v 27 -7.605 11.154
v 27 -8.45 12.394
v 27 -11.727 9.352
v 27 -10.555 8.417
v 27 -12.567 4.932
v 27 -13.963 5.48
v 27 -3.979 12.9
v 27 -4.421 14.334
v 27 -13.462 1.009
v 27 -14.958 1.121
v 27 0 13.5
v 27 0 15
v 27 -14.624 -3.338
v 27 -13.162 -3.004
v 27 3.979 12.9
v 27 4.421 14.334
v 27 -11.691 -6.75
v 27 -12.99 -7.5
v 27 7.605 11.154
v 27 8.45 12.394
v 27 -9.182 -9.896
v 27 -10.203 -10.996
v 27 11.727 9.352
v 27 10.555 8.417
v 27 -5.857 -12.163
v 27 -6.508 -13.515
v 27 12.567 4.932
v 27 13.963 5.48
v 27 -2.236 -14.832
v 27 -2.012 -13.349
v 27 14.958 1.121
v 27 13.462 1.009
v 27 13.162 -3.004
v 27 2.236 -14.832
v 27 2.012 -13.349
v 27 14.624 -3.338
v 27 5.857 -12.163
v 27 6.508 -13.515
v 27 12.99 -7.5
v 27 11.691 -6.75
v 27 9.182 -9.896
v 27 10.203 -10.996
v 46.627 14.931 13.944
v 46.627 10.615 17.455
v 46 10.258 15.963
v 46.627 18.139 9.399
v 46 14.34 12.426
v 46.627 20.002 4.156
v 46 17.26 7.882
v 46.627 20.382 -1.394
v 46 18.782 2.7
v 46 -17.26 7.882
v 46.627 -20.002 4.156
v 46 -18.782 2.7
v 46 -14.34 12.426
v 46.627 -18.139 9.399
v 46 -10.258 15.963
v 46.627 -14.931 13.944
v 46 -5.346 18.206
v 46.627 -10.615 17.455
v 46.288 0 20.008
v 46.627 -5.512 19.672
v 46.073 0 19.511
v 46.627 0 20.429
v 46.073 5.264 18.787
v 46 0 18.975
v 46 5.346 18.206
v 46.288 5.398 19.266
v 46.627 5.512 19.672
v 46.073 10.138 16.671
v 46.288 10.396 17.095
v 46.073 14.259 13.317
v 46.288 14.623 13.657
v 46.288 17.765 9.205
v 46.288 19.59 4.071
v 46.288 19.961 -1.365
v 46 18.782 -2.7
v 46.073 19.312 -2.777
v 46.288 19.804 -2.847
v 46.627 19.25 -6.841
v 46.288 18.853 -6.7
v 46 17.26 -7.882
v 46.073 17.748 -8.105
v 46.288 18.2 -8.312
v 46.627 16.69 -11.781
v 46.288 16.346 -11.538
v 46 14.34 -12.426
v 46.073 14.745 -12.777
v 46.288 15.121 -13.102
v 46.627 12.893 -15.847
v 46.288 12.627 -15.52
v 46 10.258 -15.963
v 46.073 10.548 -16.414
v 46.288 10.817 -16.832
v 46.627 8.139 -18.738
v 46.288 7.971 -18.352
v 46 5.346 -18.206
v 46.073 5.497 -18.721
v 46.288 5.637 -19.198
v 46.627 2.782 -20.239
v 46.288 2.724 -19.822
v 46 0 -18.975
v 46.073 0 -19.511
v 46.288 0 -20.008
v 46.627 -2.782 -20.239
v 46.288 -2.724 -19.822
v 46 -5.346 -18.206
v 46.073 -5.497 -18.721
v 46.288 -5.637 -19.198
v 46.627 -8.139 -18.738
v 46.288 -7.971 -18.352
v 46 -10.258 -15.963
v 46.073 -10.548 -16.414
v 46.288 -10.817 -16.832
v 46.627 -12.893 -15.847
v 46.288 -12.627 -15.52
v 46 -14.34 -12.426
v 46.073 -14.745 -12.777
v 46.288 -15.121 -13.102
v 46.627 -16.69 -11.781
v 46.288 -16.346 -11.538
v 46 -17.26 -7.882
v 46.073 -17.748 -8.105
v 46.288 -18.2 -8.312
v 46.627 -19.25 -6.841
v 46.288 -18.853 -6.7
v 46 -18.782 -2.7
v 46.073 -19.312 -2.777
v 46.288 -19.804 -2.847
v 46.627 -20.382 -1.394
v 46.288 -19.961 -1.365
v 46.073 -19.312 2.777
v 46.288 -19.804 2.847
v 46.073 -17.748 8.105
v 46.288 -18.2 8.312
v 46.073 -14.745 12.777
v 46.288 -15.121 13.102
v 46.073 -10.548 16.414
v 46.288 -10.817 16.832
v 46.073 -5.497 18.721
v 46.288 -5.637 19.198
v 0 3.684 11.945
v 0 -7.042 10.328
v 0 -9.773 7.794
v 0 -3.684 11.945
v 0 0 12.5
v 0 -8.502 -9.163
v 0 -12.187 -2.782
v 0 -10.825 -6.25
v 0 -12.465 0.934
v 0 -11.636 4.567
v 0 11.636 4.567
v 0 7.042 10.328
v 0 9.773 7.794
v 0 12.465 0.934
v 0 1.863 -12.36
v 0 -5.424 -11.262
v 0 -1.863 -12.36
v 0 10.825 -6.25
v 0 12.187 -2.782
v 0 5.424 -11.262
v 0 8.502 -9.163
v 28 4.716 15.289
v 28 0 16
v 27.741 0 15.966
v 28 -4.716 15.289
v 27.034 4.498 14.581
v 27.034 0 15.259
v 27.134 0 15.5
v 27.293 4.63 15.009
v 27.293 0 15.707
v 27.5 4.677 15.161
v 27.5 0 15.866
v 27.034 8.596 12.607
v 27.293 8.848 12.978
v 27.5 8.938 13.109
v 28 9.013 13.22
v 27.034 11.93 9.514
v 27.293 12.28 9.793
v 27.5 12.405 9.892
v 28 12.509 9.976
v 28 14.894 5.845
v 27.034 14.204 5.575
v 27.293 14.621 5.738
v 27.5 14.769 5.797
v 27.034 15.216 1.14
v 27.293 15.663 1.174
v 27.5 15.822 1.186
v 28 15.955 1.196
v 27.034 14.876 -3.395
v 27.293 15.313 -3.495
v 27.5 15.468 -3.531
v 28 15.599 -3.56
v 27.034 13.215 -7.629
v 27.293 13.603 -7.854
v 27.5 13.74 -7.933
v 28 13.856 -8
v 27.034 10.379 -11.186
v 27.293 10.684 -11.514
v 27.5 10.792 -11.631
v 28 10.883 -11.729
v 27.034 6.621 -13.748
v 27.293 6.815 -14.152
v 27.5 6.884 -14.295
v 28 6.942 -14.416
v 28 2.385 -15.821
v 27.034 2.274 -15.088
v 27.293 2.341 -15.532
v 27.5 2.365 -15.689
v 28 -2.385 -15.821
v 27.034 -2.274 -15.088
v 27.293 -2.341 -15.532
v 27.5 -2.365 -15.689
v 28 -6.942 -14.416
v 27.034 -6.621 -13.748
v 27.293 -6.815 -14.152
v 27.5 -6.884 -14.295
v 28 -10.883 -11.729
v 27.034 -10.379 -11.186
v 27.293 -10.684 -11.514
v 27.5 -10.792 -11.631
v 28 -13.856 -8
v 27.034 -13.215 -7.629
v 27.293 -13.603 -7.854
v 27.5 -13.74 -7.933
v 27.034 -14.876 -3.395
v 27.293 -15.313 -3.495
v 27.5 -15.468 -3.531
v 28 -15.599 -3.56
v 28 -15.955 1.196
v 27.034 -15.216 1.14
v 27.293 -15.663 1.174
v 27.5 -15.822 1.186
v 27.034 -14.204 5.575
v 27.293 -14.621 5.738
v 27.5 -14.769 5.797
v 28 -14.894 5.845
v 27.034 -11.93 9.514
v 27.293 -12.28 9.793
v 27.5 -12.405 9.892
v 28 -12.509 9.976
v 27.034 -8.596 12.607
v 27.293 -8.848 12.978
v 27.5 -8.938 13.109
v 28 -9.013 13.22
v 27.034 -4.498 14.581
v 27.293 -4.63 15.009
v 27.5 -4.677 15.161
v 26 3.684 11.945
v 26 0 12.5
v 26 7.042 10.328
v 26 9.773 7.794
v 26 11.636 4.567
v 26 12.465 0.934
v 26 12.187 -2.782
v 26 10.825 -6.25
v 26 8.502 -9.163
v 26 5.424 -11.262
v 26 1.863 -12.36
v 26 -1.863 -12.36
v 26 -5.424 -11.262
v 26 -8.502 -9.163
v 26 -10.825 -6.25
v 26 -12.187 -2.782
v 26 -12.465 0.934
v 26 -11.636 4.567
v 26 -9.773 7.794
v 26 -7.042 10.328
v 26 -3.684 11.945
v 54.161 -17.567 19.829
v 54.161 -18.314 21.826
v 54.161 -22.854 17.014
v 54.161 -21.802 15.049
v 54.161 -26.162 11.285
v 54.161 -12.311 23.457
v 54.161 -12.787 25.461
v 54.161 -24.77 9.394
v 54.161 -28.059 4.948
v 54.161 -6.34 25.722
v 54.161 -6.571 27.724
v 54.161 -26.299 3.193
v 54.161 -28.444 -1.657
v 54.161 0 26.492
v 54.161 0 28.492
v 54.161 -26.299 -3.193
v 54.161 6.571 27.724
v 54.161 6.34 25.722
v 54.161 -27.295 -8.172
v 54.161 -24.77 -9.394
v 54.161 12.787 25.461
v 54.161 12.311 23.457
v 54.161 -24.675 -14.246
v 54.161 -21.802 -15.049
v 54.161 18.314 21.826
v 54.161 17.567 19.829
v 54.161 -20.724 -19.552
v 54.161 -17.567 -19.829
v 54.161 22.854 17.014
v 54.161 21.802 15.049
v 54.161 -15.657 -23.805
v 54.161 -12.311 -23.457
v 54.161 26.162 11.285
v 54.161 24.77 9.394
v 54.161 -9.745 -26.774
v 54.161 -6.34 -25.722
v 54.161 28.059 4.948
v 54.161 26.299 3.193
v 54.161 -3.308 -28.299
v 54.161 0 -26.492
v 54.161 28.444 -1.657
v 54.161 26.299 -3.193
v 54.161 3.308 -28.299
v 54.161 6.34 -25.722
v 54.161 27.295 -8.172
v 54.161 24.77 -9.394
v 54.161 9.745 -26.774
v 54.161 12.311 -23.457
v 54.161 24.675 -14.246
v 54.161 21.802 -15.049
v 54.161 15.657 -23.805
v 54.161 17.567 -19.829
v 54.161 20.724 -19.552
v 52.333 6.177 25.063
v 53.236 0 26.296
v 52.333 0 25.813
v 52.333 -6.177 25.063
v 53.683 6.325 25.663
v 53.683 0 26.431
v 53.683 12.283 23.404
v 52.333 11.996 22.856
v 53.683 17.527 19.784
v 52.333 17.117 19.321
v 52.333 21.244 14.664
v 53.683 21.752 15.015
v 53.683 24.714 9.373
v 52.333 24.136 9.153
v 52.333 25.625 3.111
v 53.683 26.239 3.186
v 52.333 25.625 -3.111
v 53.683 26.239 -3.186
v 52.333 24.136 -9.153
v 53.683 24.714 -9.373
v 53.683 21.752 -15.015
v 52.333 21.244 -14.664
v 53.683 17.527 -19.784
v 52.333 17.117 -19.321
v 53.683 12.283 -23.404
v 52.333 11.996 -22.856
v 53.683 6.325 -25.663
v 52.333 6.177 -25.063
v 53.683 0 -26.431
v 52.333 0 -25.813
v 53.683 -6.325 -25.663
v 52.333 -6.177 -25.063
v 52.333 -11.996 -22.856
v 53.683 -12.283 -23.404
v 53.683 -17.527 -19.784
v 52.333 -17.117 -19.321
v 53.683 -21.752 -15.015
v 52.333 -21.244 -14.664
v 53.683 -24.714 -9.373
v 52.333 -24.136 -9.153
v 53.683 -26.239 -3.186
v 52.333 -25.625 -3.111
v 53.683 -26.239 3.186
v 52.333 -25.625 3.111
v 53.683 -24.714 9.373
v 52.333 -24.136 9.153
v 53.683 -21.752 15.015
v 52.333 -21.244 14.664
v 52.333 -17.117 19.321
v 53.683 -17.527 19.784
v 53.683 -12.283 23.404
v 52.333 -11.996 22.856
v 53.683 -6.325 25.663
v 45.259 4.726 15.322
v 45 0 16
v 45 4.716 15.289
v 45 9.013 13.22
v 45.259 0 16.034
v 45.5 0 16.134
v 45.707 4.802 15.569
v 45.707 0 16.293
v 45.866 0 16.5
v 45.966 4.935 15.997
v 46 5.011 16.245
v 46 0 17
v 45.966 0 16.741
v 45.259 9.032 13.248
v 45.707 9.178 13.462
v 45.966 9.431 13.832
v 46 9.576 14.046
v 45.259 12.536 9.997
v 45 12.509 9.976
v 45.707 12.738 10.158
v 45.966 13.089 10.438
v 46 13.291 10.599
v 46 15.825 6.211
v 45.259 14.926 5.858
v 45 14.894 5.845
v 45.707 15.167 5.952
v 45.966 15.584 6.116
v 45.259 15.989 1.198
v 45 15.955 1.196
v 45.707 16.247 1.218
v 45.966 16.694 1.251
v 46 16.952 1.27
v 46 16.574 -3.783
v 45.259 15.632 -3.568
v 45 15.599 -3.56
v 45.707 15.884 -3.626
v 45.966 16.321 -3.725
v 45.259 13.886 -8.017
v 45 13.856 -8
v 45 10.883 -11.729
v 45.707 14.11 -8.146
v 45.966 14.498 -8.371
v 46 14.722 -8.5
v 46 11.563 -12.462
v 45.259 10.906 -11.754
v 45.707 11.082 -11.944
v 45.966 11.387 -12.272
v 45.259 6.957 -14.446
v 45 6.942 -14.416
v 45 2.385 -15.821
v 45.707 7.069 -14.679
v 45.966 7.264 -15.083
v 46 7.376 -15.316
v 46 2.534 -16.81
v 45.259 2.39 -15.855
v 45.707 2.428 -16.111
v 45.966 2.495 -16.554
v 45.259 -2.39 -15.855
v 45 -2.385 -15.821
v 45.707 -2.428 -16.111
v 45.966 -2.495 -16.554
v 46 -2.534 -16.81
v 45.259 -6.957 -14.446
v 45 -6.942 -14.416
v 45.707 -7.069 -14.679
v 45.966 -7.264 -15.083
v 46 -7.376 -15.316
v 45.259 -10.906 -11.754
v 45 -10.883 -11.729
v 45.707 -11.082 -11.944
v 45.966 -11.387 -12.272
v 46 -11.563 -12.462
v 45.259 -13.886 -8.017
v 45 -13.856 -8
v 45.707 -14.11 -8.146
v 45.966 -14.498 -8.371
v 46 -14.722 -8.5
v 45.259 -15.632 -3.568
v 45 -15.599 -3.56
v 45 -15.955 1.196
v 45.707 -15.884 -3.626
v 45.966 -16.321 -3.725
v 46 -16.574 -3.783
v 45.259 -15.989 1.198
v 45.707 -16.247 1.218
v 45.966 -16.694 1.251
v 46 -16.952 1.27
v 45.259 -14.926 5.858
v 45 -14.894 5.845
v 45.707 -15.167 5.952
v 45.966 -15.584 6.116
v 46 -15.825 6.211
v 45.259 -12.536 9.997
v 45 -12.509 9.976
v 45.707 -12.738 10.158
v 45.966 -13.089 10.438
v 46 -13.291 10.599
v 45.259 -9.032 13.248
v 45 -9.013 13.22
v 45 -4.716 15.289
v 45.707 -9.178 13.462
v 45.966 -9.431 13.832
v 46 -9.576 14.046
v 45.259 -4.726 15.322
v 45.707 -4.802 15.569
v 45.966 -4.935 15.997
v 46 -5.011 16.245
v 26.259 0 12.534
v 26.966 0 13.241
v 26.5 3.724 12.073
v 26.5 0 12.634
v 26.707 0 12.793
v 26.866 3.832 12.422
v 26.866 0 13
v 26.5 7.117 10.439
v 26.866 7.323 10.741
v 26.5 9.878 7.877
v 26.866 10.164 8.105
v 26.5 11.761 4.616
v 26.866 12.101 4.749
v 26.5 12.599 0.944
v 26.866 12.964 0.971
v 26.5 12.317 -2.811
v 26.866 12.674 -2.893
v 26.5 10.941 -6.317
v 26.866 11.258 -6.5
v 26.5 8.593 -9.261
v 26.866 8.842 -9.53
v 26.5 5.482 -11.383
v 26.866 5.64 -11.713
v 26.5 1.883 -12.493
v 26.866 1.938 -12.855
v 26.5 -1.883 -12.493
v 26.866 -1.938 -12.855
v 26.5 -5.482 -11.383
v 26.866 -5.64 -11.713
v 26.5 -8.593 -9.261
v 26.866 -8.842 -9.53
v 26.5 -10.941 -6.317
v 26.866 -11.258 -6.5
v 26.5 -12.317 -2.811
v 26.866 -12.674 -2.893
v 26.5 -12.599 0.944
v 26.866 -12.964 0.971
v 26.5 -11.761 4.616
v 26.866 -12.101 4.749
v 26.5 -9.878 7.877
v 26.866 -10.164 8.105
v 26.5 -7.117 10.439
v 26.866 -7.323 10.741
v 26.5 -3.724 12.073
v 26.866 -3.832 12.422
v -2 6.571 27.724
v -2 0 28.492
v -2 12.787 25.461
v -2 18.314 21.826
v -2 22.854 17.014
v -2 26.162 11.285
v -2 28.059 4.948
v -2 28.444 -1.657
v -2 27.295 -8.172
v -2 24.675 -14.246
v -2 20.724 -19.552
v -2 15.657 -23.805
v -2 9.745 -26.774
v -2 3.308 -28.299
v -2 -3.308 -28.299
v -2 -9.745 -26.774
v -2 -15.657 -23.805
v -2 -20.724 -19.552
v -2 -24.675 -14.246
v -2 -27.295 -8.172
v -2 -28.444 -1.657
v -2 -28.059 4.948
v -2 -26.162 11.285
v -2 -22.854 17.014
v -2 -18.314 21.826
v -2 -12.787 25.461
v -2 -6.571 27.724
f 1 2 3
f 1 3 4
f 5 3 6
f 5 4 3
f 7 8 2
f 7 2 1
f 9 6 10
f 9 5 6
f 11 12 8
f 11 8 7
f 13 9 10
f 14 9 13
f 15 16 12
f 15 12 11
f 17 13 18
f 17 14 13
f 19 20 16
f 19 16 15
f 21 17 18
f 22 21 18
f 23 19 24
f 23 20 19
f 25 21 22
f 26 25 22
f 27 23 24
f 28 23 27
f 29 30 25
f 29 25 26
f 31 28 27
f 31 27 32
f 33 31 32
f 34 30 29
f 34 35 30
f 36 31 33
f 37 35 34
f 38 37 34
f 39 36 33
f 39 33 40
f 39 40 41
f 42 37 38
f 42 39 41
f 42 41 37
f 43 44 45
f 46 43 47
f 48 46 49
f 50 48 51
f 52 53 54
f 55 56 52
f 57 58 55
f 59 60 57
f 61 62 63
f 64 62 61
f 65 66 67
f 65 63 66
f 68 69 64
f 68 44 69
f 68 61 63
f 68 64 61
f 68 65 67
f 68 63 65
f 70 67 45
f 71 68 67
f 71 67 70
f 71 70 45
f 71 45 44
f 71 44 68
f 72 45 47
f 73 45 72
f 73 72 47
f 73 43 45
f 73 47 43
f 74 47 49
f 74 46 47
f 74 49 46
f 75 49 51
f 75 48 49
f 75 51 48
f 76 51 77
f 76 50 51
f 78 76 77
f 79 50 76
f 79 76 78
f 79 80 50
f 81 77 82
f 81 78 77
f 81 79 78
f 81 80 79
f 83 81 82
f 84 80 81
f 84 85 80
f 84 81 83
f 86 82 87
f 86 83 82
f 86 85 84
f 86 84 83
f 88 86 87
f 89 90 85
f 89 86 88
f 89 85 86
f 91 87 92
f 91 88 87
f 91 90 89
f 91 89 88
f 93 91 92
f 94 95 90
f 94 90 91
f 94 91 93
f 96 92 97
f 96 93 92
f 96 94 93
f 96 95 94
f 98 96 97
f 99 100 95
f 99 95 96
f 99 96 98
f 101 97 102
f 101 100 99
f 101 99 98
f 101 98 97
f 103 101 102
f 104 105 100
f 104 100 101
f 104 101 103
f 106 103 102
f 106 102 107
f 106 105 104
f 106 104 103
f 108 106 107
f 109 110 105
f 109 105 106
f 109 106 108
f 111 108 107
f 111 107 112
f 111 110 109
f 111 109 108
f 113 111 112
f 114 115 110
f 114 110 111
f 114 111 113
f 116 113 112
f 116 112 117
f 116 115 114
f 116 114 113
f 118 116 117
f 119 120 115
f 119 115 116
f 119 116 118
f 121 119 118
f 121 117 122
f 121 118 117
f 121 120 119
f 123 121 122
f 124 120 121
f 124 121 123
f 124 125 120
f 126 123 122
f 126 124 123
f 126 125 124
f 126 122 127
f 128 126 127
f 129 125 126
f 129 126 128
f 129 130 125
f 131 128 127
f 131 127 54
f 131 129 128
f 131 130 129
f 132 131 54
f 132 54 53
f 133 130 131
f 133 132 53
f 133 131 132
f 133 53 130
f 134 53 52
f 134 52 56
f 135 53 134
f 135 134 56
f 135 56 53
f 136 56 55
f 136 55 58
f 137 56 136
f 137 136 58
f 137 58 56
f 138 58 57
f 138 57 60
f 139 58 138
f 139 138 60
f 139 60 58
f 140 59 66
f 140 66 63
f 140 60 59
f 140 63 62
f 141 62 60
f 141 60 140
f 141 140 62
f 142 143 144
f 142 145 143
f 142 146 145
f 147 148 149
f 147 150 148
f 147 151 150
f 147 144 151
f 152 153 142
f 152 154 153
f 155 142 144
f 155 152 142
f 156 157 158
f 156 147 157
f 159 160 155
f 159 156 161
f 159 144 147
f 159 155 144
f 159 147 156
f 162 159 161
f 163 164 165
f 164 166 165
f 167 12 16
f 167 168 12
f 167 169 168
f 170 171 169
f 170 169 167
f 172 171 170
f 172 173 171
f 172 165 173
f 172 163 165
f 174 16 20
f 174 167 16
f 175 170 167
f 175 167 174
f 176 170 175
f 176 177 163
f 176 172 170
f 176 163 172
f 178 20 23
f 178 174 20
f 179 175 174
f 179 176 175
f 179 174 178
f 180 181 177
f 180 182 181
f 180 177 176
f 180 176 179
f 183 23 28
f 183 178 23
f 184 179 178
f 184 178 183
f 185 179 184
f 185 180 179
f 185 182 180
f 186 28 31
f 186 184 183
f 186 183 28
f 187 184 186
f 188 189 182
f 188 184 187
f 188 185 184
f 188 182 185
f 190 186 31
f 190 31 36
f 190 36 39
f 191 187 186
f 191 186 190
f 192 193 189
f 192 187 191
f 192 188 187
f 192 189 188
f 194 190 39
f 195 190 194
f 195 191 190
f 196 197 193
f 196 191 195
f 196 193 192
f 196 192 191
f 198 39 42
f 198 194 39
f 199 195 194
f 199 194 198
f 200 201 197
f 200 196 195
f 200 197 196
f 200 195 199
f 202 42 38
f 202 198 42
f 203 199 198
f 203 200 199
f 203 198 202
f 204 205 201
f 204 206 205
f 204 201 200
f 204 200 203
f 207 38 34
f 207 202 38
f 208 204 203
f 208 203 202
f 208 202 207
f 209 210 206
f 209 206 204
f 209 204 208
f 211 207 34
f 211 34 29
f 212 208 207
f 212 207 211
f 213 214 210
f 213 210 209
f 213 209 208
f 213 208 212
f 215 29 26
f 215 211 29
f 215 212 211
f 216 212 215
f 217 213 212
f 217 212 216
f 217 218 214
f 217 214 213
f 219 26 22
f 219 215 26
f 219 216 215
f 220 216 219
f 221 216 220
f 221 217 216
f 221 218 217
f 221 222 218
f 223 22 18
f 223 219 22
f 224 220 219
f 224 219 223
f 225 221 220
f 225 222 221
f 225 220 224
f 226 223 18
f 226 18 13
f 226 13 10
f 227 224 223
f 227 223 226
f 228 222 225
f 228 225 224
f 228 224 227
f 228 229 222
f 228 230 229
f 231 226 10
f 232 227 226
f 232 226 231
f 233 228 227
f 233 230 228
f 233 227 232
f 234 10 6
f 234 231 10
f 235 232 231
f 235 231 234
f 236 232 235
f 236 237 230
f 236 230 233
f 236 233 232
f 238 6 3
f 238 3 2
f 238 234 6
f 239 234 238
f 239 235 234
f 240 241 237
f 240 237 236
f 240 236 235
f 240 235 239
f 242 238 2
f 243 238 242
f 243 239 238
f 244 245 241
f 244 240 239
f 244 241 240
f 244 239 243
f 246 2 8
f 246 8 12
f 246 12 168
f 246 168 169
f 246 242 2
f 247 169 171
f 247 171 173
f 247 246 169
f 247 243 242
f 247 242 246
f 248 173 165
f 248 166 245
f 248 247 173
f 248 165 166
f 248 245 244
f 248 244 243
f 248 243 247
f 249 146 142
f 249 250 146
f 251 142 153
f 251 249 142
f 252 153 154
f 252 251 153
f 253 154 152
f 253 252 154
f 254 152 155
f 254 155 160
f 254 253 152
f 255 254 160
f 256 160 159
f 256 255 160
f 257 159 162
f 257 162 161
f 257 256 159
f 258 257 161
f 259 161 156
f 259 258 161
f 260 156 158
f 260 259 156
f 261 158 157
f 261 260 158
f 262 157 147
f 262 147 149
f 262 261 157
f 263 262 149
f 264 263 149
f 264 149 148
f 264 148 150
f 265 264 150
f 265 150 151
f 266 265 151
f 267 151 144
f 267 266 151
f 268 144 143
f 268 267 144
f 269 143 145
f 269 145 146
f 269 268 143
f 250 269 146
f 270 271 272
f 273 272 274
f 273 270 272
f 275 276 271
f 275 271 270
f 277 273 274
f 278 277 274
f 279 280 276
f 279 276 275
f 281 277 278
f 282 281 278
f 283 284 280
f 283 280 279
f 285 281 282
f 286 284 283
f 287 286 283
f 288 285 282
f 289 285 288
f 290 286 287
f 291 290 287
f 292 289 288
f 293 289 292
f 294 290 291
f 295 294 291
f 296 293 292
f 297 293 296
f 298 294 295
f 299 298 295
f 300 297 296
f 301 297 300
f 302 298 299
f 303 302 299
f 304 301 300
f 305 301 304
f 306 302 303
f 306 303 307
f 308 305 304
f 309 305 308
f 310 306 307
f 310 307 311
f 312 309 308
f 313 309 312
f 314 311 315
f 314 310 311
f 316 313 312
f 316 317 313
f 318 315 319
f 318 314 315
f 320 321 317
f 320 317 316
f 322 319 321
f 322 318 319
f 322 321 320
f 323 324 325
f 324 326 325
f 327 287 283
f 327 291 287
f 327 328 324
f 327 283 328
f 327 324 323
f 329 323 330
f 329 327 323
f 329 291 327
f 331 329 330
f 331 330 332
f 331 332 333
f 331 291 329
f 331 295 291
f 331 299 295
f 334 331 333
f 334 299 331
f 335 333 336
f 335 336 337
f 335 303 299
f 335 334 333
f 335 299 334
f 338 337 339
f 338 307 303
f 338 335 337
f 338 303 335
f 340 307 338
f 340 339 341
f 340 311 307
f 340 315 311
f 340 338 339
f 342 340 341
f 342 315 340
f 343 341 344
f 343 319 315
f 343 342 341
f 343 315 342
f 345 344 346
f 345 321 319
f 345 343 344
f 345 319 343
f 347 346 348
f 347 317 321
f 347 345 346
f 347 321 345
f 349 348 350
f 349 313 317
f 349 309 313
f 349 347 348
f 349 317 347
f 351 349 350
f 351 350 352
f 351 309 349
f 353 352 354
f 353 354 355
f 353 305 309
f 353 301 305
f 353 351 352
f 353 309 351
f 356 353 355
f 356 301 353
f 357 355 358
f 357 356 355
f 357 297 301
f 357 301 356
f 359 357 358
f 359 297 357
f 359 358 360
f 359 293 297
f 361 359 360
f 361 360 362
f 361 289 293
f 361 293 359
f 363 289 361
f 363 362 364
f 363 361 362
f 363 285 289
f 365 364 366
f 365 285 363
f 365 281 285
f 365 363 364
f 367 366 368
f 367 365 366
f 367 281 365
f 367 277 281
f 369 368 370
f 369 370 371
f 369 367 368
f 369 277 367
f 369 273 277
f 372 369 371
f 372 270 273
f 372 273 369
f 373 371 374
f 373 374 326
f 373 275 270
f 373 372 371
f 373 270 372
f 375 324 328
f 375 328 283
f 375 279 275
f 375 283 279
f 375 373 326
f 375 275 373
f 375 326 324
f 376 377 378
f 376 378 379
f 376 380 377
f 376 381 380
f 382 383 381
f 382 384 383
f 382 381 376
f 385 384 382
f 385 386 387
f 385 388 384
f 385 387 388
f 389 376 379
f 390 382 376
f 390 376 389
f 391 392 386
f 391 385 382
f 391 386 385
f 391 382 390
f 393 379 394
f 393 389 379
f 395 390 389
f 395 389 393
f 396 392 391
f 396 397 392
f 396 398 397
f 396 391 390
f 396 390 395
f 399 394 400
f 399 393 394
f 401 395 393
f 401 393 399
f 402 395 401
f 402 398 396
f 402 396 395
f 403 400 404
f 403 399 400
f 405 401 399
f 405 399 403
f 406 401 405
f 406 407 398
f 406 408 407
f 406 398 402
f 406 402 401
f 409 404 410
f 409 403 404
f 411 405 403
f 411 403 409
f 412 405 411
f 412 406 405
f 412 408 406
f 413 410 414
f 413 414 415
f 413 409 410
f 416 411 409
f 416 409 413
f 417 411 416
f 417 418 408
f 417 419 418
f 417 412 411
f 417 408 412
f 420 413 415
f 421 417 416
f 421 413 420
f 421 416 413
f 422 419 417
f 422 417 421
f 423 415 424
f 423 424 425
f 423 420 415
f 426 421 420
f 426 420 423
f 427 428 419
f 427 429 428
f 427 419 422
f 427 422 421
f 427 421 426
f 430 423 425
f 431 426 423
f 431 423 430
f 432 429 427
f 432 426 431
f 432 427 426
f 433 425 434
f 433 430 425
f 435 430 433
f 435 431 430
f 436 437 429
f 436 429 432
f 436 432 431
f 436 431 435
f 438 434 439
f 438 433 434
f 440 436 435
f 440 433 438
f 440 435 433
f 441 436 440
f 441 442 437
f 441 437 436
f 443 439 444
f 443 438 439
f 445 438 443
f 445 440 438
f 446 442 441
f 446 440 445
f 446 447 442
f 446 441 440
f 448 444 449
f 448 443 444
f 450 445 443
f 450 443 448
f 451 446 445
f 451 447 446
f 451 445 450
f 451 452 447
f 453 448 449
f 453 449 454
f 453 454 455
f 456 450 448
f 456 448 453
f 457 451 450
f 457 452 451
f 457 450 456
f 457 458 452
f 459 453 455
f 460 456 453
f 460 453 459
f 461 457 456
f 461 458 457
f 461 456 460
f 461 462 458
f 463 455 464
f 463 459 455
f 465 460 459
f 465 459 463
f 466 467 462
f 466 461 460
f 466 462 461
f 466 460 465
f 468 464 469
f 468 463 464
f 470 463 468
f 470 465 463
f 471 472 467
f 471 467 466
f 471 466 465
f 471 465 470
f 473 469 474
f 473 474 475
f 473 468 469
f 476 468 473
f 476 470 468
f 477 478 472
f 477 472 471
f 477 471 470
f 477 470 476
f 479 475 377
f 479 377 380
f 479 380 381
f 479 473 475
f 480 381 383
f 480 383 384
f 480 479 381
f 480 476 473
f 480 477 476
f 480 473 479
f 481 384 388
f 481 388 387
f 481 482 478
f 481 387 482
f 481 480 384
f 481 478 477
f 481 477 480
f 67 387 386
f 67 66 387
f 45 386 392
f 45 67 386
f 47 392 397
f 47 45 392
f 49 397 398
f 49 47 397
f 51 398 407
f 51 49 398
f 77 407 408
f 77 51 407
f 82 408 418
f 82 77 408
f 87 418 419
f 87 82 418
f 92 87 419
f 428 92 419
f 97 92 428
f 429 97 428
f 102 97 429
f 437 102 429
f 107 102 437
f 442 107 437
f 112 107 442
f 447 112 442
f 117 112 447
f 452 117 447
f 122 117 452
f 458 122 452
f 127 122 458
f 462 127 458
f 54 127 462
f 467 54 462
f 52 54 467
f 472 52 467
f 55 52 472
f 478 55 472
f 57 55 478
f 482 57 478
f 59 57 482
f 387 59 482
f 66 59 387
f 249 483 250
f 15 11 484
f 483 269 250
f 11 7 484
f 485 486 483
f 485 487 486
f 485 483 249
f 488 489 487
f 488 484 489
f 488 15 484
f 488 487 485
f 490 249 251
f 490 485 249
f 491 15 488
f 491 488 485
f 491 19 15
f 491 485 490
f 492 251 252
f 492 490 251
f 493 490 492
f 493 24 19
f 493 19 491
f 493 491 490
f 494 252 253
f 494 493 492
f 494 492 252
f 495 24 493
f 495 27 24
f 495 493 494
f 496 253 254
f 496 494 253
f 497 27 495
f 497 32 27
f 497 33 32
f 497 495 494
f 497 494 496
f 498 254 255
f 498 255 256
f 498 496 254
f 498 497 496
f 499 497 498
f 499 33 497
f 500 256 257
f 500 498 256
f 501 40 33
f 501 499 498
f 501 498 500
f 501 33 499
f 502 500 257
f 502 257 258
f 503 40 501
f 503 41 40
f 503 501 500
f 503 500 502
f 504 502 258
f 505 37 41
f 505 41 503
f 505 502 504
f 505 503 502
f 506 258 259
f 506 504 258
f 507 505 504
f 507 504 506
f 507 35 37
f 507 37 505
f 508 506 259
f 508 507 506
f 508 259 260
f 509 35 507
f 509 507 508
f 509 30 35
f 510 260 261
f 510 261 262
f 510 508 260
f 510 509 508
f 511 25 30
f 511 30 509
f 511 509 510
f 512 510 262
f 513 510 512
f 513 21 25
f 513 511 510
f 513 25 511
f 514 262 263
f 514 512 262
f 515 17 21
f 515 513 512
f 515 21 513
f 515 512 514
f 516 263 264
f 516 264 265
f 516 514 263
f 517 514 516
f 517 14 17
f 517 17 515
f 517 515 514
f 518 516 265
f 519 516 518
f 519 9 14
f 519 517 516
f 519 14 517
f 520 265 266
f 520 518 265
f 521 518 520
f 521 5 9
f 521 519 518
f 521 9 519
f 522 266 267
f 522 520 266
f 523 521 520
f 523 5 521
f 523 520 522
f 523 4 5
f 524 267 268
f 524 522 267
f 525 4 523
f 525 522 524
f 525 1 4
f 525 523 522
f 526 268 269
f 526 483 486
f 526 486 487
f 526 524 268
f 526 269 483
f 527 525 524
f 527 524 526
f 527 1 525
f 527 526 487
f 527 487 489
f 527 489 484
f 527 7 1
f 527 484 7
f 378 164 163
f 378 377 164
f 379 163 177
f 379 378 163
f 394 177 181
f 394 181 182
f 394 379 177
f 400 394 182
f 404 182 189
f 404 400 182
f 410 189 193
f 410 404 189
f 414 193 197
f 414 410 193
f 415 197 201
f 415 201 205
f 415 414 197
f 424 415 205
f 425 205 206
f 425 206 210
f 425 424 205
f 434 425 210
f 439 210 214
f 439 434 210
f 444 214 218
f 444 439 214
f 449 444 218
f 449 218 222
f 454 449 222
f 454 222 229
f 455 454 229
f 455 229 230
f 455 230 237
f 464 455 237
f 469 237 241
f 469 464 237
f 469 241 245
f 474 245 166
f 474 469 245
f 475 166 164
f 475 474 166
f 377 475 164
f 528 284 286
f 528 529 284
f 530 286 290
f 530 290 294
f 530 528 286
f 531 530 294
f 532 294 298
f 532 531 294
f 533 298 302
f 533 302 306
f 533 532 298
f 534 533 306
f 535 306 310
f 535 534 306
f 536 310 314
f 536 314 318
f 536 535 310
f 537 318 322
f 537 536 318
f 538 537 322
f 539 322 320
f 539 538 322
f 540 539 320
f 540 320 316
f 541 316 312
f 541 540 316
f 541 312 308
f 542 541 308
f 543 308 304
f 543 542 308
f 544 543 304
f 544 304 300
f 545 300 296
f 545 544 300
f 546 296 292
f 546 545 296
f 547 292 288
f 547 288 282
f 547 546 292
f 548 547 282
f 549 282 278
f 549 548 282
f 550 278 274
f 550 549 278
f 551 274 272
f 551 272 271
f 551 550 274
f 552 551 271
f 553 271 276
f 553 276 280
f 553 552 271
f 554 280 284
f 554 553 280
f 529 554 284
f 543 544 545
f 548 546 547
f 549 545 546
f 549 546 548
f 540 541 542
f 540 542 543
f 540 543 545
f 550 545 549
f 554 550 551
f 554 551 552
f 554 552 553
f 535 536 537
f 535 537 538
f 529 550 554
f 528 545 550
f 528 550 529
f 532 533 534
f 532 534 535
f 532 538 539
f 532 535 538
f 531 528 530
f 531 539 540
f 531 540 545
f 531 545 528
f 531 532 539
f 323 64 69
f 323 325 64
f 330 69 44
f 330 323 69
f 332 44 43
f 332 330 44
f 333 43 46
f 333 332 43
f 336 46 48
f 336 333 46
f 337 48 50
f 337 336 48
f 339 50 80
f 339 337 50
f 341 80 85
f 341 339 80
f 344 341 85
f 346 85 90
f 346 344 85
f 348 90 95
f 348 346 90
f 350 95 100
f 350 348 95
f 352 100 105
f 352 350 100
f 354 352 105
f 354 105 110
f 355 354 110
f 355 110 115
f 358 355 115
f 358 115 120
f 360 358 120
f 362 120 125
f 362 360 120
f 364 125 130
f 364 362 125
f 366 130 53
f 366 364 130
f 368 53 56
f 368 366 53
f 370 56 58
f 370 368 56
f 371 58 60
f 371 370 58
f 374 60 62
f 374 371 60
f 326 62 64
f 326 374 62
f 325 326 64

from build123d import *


with BuildPart() as f1:
    # F0 (on Front) → F1 (revolve)
    with BuildSketch(Plane.XZ):
        with BuildLine():
            Line((46.6274327665, 20.4293505417), (52.3332152067, 25.8130880211))
            add(Edge.make_bspline(
                [(52.3332152067, 25.8130880211), (52.6873531533, 26.0396653478), (53.287973728, 26.3773534836), (53.9061448765, 26.4795545854), (54.1609440093, 26.4919212472)],
                knots=[0.0753740232, 0.0753740232, 0.0753740232, 0.0753740232, 0.236653892, 0.3473965491, 0.3473965491, 0.3473965491, 0.3473965491], degree=3))
            Line((54.1609440093, 26.4919212472), (54.1609440093, 28.4919212472))
            Line((54.1609440093, 28.4919212472), (0, 28.4919212472))
            Line((0, 28.4919212472), (-2, 28.4919212472))
            Line((-2, 28.4919212472), (-2, 0))
            Line((-2, 0), (0, 0))
            Line((0, 0), (0, 12.5))
            Line((0, 12.5), (26, 12.5))
            ThreePointArc((26, 12.5), (26.7071067812, 12.7928932188), (27, 13.5))
            Line((27, 13.5), (27, 15))
            ThreePointArc((27, 15), (27.2928932188, 15.7071067812), (28, 16))
            Line((28, 16), (44.9999994072, 16))
            ThreePointArc((44.9999994072, 16), (45.707106398, 16.2928934284), (45.9999994072, 17.0000005928))
            Line((45.9999994072, 17.0000005928), (45.9999982367, 18.9746813235))
            ThreePointArc((45.9999982367, 18.9746813235), (46.1635437461, 19.7667886958), (46.6274327665, 20.4293505417))
        make_face()
    revolve(axis=Axis((19.5, 0, 0), (-1, 0, 0)))


solid = f1.part
